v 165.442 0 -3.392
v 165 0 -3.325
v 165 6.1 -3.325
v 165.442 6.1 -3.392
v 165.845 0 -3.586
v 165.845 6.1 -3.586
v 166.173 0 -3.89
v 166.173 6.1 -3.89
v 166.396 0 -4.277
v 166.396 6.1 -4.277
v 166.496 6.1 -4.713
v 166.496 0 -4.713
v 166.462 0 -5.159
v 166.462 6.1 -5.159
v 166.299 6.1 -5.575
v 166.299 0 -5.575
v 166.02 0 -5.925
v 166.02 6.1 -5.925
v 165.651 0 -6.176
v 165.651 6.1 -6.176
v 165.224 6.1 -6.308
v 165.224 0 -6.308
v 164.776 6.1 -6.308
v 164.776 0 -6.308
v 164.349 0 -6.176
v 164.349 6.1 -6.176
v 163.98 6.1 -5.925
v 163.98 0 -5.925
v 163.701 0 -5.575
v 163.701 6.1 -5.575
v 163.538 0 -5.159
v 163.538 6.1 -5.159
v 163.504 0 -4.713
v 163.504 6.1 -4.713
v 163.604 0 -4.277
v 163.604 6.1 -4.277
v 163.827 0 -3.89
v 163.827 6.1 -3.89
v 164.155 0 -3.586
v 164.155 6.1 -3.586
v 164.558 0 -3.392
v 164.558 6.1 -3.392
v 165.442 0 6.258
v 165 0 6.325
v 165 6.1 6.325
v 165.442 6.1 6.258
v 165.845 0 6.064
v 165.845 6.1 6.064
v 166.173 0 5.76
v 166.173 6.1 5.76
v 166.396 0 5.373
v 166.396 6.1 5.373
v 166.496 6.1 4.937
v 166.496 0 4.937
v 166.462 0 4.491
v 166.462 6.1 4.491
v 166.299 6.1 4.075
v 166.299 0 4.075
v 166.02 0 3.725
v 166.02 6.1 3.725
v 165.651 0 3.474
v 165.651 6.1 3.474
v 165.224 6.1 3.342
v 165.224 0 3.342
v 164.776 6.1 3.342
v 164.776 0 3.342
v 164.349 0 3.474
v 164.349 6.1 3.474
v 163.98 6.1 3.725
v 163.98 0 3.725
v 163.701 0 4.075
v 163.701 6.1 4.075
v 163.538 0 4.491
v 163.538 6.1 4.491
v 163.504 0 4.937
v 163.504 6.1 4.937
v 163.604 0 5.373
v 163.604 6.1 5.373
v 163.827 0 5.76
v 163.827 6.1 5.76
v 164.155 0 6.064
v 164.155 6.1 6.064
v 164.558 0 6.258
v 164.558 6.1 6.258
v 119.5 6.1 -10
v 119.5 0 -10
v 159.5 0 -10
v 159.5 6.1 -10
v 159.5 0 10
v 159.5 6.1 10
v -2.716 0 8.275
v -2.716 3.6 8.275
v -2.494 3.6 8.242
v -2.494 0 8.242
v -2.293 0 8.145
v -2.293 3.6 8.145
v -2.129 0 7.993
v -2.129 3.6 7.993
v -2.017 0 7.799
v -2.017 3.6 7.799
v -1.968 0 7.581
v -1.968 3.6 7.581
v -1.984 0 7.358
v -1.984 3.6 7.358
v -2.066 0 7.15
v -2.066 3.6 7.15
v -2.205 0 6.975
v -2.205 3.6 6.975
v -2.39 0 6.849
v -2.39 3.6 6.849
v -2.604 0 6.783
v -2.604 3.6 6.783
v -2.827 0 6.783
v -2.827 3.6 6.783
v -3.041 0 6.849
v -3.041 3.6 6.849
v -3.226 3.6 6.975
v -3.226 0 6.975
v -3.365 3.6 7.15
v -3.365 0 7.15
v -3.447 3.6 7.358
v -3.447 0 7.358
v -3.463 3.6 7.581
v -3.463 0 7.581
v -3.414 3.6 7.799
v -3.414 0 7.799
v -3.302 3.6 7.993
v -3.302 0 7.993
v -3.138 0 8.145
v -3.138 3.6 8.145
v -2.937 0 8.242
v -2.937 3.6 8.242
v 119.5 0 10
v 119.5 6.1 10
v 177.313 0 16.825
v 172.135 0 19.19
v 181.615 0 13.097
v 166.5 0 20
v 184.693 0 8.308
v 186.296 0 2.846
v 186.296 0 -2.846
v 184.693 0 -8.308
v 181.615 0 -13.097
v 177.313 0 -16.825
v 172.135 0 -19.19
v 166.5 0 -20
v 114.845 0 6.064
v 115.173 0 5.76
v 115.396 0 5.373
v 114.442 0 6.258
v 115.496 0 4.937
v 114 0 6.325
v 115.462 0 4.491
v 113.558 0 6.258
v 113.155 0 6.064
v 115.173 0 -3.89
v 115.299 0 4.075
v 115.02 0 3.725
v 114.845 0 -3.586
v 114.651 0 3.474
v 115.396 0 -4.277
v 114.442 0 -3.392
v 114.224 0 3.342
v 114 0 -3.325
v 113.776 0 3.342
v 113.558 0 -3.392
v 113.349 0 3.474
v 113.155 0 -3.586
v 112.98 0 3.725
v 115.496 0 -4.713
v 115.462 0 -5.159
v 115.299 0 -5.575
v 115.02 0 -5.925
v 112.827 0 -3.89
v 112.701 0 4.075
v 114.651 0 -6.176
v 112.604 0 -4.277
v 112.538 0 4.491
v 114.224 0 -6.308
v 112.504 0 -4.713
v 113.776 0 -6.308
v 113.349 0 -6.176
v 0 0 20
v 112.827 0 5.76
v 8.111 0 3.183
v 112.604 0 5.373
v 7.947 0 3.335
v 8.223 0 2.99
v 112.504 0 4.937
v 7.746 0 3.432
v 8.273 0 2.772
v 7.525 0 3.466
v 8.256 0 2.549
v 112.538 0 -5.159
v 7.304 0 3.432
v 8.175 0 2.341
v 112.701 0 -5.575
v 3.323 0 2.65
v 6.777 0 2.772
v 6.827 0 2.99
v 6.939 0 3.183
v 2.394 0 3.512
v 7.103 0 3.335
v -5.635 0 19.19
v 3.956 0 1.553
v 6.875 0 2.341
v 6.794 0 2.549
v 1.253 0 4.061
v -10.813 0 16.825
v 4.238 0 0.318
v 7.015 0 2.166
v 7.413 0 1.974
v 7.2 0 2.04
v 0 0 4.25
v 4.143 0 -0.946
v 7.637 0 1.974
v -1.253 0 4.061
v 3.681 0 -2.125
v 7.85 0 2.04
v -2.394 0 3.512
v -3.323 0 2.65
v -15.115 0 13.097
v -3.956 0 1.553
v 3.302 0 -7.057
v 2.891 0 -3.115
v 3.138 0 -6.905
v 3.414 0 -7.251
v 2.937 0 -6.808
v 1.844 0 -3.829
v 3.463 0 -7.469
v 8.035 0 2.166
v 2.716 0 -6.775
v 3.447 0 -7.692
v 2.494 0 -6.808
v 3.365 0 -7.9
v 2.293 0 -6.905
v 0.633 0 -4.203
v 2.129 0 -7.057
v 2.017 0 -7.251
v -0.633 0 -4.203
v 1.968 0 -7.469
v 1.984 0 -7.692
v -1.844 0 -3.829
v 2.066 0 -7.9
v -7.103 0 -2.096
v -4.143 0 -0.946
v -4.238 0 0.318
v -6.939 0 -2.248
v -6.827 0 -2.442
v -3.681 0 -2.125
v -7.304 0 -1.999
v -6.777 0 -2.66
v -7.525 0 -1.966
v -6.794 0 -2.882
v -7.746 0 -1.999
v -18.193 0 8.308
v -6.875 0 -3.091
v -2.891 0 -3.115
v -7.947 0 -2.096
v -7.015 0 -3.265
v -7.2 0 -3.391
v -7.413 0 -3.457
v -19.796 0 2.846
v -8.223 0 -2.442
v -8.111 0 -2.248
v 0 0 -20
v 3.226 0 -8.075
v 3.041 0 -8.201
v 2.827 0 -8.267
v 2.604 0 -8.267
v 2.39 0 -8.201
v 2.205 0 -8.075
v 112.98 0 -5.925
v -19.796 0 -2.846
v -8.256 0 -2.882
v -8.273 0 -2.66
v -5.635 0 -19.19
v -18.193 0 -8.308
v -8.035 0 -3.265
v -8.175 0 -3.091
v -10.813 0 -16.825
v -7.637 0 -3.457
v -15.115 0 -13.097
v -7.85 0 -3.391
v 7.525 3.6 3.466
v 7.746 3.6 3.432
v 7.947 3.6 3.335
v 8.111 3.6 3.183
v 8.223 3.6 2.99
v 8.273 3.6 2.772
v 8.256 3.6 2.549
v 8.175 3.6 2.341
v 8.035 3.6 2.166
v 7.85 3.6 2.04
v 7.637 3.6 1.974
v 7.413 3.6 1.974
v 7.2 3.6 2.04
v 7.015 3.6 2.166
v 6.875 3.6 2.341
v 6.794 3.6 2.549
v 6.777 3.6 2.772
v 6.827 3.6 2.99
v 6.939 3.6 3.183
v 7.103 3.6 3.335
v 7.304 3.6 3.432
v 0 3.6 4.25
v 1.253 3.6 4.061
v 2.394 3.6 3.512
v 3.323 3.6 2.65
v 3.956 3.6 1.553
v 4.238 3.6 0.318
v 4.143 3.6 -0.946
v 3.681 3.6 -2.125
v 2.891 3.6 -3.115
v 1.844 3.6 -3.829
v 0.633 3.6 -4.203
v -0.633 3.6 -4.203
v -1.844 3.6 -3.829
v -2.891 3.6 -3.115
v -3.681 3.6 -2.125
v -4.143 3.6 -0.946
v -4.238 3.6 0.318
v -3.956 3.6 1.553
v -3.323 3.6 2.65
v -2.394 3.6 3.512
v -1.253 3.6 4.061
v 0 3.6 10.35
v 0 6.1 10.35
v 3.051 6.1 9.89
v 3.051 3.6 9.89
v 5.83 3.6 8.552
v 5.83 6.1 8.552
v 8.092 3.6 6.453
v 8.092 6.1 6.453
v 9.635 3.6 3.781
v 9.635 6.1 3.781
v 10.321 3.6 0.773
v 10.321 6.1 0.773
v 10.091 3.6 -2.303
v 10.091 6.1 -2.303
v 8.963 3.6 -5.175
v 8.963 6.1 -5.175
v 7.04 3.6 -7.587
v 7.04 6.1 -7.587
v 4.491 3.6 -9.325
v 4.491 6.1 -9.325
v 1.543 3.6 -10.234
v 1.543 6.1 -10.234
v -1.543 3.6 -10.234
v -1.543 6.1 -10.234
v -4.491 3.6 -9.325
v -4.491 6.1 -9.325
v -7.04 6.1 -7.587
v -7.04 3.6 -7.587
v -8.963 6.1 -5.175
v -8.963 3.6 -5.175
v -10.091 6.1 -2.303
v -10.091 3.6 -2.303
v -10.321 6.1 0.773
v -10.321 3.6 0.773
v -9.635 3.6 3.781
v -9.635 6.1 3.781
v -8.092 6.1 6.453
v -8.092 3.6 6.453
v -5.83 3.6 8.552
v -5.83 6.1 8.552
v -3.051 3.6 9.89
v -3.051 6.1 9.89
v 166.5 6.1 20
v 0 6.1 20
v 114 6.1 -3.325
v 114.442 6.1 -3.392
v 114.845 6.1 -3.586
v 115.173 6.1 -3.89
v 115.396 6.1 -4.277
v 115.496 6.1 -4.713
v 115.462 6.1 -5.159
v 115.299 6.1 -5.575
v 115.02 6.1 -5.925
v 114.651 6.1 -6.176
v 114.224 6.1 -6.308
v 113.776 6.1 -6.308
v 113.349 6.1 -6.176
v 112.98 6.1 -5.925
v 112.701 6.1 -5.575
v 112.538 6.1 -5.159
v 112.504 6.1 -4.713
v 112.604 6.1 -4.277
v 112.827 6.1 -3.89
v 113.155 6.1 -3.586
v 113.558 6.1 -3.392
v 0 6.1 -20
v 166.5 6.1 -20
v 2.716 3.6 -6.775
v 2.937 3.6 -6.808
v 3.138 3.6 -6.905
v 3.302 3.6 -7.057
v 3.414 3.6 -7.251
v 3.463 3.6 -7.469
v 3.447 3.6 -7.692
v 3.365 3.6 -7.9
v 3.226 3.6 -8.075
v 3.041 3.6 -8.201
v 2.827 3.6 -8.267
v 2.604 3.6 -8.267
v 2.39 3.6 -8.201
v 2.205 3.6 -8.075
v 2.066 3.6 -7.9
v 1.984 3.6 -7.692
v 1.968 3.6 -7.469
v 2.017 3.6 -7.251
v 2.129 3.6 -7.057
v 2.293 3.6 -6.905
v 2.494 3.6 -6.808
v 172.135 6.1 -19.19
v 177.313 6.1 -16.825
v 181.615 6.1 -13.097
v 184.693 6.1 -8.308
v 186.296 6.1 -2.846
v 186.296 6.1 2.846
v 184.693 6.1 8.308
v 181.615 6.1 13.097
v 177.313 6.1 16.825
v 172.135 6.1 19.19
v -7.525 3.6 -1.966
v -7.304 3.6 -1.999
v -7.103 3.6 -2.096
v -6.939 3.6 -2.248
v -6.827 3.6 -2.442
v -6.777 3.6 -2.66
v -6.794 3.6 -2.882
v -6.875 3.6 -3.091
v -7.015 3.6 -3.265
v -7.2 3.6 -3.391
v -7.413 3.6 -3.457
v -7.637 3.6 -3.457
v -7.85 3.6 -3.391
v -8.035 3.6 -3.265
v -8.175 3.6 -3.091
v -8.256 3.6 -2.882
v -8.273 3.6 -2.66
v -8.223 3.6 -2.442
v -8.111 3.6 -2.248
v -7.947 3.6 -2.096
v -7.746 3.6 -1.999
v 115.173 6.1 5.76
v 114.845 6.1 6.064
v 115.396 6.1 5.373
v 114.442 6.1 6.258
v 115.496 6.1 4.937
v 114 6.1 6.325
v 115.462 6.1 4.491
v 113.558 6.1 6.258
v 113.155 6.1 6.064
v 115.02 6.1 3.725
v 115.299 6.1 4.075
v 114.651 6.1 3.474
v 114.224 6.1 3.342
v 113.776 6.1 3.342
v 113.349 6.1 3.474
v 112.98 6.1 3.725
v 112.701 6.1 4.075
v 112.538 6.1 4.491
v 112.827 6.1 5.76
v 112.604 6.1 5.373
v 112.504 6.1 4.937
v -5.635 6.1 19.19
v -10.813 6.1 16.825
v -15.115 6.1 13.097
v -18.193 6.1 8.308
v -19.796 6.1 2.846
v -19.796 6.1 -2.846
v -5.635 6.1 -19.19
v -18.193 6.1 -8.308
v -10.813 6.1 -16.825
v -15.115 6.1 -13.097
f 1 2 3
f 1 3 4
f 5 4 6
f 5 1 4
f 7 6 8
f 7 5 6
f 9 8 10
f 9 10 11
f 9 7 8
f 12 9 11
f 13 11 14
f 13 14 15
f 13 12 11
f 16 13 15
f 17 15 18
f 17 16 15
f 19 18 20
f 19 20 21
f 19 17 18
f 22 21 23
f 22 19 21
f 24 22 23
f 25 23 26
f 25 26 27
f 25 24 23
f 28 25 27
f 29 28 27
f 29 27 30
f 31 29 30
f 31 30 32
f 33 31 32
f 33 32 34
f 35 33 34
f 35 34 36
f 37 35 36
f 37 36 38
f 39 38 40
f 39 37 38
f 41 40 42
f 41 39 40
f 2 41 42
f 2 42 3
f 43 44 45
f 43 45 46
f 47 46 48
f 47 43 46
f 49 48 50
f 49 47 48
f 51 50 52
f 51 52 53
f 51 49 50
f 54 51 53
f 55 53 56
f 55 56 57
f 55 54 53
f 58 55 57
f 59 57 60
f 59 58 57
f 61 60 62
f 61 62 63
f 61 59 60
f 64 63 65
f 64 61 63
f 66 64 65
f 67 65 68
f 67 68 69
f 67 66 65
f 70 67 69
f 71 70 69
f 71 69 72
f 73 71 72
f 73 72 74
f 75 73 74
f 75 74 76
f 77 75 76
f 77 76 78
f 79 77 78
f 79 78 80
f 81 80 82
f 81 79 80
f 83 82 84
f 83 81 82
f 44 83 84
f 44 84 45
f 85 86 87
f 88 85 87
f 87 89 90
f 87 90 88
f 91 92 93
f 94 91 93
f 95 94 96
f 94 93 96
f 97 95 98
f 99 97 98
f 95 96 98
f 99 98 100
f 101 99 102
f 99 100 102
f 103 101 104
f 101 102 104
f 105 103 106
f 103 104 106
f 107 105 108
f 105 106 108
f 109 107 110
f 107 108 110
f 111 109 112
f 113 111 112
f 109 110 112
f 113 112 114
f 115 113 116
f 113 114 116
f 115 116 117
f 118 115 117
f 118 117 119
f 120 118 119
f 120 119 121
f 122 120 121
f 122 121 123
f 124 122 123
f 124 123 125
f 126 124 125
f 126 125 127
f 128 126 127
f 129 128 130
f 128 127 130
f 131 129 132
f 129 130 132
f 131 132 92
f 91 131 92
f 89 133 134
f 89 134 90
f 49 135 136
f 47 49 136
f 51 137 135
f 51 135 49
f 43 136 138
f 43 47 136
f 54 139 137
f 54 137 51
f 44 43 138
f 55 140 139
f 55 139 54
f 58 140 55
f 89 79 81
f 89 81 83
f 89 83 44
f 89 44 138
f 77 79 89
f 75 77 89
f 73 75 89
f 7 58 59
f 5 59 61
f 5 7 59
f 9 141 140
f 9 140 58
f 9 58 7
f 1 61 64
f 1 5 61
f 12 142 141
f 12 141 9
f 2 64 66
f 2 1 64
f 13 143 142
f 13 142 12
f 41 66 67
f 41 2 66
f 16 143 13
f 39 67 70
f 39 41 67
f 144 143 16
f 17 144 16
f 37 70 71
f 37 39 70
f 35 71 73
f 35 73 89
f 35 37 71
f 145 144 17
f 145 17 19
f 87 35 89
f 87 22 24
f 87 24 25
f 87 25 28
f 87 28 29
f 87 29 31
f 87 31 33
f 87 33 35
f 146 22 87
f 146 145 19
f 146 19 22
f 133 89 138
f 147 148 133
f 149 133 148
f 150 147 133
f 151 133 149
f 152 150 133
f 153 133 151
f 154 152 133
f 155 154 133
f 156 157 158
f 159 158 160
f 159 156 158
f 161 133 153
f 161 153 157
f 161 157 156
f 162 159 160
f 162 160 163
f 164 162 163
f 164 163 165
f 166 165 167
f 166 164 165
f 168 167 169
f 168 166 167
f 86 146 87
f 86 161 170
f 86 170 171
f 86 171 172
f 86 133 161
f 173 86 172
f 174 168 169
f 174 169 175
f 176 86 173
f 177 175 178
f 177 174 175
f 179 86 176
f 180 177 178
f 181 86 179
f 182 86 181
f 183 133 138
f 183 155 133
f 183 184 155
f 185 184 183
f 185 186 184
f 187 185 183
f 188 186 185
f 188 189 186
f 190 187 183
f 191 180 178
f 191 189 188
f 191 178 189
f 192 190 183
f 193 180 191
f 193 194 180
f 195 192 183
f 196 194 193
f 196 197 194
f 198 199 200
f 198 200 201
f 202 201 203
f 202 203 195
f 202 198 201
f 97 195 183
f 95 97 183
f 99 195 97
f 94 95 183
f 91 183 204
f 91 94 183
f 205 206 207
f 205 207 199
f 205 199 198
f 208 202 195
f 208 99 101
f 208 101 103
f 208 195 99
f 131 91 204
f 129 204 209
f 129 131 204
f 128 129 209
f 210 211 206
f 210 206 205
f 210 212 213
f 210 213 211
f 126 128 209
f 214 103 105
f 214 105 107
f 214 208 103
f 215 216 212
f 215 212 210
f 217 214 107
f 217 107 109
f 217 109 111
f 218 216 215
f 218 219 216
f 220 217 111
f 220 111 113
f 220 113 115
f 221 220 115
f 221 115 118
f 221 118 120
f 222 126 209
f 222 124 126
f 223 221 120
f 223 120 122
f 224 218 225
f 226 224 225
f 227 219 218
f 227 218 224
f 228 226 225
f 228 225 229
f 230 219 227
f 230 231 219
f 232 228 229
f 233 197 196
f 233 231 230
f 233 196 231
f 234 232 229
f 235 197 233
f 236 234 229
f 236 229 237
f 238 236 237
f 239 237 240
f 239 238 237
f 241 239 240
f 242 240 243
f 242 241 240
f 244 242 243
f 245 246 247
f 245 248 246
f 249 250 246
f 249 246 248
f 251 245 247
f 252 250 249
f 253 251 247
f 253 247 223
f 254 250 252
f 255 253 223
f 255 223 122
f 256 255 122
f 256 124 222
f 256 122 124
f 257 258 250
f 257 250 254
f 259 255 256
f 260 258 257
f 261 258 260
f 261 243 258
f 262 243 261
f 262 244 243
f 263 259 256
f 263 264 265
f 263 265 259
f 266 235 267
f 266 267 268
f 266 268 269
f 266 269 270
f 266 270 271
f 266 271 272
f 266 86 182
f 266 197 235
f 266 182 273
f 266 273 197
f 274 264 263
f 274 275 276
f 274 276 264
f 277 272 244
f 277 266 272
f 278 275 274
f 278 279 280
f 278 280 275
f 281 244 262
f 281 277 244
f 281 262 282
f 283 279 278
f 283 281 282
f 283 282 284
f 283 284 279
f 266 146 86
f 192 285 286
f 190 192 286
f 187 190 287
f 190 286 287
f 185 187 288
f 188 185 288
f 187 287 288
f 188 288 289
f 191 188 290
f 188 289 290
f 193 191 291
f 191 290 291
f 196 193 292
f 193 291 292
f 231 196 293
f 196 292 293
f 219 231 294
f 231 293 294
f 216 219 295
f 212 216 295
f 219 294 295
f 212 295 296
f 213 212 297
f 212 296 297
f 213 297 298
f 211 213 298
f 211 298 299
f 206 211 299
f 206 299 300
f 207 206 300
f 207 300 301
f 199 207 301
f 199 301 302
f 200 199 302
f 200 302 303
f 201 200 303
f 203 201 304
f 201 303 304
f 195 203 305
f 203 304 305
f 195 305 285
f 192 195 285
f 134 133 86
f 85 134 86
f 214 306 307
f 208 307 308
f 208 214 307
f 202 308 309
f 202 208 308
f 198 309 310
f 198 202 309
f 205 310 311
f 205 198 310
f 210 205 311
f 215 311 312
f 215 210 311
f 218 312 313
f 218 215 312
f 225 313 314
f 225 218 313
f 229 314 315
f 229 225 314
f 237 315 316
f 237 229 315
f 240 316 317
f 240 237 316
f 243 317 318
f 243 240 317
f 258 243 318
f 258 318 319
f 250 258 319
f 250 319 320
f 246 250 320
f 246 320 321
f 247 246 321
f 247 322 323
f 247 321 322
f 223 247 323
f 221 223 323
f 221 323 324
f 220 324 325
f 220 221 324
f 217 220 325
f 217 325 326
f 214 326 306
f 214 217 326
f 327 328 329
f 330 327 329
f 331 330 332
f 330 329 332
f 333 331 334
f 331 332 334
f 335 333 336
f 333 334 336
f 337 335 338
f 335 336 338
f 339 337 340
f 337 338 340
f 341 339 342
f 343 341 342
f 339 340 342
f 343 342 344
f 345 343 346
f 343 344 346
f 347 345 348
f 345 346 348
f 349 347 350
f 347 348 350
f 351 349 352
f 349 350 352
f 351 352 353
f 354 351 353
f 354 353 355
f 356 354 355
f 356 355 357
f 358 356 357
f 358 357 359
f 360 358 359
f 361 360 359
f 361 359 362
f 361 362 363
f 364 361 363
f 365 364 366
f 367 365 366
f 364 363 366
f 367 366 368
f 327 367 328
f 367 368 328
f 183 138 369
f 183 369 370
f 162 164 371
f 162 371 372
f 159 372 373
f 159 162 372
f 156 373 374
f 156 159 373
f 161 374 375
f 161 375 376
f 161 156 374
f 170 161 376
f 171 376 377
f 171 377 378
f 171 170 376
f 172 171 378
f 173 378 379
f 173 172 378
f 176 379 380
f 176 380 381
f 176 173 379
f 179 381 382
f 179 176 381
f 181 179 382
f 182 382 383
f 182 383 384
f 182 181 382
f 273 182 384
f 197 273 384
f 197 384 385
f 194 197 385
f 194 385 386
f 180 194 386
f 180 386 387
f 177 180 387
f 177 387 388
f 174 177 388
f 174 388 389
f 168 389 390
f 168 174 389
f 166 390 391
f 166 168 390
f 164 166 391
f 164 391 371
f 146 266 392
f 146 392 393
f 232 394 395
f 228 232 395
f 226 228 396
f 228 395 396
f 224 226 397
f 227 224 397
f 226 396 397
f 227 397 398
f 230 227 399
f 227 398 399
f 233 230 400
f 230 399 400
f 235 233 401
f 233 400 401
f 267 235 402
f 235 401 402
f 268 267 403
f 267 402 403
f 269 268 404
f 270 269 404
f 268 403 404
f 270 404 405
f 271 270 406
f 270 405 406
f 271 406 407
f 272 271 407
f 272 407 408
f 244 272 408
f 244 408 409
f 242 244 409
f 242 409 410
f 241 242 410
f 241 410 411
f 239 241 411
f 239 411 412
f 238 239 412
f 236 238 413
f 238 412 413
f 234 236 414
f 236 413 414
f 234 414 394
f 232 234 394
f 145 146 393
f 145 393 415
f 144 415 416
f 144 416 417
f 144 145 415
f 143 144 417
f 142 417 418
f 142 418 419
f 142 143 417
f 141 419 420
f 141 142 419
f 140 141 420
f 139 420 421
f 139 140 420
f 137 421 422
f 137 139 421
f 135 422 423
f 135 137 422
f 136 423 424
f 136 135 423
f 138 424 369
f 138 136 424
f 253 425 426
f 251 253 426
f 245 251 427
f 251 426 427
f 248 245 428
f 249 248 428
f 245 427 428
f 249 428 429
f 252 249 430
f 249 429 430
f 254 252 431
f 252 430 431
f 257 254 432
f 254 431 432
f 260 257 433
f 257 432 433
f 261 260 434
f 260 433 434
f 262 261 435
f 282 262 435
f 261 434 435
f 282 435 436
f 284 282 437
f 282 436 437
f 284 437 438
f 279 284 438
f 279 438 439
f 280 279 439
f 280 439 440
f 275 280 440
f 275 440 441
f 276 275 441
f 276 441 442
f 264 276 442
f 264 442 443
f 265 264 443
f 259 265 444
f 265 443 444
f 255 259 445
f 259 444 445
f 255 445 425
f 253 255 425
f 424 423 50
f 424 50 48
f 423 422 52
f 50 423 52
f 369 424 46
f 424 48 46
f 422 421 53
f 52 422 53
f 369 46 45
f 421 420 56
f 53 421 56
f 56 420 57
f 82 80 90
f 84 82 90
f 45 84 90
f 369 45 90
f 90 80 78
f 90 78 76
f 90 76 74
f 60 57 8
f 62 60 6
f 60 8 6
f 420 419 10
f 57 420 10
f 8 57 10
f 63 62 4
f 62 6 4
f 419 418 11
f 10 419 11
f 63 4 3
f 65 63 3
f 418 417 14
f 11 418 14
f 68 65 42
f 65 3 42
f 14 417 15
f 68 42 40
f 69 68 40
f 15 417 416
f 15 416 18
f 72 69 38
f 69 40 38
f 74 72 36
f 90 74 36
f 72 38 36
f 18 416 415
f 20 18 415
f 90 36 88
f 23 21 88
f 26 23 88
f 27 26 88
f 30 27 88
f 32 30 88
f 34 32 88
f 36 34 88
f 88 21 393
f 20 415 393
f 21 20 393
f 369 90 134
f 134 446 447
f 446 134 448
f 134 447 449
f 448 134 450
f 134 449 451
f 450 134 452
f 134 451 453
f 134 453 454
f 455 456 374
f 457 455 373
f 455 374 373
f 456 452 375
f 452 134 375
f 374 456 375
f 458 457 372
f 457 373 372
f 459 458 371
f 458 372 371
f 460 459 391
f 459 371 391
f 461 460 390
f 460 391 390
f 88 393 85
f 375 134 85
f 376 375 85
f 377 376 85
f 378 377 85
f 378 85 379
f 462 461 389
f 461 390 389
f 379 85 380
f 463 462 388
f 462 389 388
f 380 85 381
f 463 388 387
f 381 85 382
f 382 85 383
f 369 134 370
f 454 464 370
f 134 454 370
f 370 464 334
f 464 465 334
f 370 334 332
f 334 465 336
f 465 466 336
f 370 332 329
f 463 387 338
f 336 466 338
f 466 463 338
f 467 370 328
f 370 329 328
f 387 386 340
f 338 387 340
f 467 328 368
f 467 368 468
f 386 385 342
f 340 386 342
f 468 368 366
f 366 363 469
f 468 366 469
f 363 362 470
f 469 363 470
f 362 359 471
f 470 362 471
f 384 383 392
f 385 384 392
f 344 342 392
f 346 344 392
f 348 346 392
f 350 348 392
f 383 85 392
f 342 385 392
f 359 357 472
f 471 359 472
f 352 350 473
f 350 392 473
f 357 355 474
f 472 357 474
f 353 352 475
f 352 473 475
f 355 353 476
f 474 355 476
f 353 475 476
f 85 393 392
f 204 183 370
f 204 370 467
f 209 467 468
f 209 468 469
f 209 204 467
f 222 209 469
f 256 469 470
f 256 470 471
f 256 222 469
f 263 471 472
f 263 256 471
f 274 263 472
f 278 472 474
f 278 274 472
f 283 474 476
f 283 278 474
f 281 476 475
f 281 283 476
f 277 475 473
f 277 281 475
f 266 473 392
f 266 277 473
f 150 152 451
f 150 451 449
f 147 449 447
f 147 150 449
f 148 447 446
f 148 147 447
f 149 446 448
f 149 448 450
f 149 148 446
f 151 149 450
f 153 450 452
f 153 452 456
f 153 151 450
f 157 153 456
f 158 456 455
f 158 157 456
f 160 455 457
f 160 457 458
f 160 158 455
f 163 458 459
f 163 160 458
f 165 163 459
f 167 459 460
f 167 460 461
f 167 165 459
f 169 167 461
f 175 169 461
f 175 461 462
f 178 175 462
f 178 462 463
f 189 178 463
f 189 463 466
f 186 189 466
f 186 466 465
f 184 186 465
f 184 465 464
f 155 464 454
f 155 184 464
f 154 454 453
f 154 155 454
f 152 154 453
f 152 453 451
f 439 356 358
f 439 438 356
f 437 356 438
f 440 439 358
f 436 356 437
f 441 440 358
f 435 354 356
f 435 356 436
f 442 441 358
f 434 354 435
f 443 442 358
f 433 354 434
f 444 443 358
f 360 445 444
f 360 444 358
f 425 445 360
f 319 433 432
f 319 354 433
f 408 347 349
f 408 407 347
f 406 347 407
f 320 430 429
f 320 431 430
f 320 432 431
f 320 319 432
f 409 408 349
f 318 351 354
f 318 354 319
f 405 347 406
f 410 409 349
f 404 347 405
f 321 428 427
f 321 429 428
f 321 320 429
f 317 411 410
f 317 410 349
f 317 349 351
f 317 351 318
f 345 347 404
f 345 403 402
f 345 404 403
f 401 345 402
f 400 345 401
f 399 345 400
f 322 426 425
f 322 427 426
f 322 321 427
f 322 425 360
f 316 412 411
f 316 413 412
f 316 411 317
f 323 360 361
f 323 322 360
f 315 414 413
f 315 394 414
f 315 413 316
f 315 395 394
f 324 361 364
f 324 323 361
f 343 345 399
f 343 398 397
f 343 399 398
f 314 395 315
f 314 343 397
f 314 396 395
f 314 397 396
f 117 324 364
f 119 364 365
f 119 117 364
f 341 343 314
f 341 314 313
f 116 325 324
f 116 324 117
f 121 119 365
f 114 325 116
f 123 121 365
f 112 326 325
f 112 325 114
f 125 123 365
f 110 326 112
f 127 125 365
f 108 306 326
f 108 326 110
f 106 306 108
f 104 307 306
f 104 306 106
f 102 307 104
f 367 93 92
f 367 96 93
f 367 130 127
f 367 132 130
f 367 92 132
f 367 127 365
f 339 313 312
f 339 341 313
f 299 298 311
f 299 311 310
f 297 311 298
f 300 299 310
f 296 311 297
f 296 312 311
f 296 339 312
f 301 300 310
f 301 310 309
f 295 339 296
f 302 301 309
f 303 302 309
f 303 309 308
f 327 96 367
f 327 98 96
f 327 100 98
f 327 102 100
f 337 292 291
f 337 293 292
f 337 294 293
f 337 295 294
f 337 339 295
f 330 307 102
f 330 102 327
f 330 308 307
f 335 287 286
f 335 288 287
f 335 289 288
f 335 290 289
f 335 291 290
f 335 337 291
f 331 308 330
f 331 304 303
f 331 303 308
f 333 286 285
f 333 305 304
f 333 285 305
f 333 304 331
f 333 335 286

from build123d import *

# Parameters (mm, degrees)
SKETCH1_R           = 4.25
SKETCH1_R_2         = 1.5
SKETCH1_W           = 40
SKETCH1_H           = 20
BOSS_EXTRUDE1_DEPTH = 6.1
SKETCH2_R           = 10.35
CUT_EXTRUDE1_DEPTH  = 2.5
SKETCH3_R           = 0.75
CUT_EXTRUDE3_DEPTH  = 3.6


with BuildPart() as part:
    # Sketch1 → Boss-Extrude1 (new body)
    with BuildSketch(Plane(origin=(0, 0, 0), x_dir=(1, 0, 0), z_dir=(0, 1, 0))):
        with BuildLine():
            Line((150, 20), (159.5, 20))
            Line((159.5, 20), (166.5, 20))
            ThreePointArc((166.5, 20), (186.5, 0), (166.5, -20))
            Line((166.5, -20), (159.5, -20))
            Line((159.5, -20), (150, -20))
            Line((150, -20), (0, -20))
            ThreePointArc((0, -20), (-20, 0), (0, 20))
            Line((0, 20), (150, 20))
        make_face()
        with Locations(Location((0, 0, 0), (0, 0, 270))):
            Circle(SKETCH1_R, mode=Mode.SUBTRACT)
        with Locations(Location((165, 4.825, 0), (0, 0, 270))):
            Circle(SKETCH1_R_2, mode=Mode.SUBTRACT)
        with Locations(Location((165, -4.825, 0), (0, 0, 270))):
            Circle(SKETCH1_R_2, mode=Mode.SUBTRACT)
        with Locations(Location((114, 4.825, 0), (0, 0, 270))):
            Circle(SKETCH1_R_2, mode=Mode.SUBTRACT)
        with Locations(Location((114, -4.825, 0), (0, 0, 270))):
            Circle(SKETCH1_R_2, mode=Mode.SUBTRACT)
        with Locations((139.5, 0)):
            Rectangle(SKETCH1_W, SKETCH1_H, mode=Mode.SUBTRACT)
    extrude(amount=BOSS_EXTRUDE1_DEPTH)

    # Sketch2 → Cut-Extrude1 (cut)
    with BuildSketch(Plane(origin=(0, 6.1, 0), x_dir=(1, 0, 0), z_dir=(0, 1, 0))):
        with Locations(Location((0, 0, 0), (0, 0, 270))):
            Circle(SKETCH2_R)
    extrude(amount=-CUT_EXTRUDE1_DEPTH, mode=Mode.SUBTRACT)

    # Sketch3 → Cut-Extrude3 (cut)
    with BuildSketch(Plane(origin=(0, 3.6, 0), x_dir=(1, 0, 0), z_dir=(0, 1, 0))):
        with Locations(Location((-7.52500865, 2.715556079, 0), (0, 0, 270))):
            Circle(SKETCH3_R)
        with Locations(Location((7.52500865, -2.715556079, 0), (0, 0, 270))):
            Circle(SKETCH3_R)
        with Locations(Location((2.715556079, 7.52500865, 0), (0, 0, 270))):
            Circle(SKETCH3_R)
        with Locations(Location((-2.715556079, -7.52500865, 0), (0, 0, 270))):
            Circle(SKETCH3_R)
    extrude(amount=-CUT_EXTRUDE3_DEPTH, mode=Mode.SUBTRACT)


solid = part.part
